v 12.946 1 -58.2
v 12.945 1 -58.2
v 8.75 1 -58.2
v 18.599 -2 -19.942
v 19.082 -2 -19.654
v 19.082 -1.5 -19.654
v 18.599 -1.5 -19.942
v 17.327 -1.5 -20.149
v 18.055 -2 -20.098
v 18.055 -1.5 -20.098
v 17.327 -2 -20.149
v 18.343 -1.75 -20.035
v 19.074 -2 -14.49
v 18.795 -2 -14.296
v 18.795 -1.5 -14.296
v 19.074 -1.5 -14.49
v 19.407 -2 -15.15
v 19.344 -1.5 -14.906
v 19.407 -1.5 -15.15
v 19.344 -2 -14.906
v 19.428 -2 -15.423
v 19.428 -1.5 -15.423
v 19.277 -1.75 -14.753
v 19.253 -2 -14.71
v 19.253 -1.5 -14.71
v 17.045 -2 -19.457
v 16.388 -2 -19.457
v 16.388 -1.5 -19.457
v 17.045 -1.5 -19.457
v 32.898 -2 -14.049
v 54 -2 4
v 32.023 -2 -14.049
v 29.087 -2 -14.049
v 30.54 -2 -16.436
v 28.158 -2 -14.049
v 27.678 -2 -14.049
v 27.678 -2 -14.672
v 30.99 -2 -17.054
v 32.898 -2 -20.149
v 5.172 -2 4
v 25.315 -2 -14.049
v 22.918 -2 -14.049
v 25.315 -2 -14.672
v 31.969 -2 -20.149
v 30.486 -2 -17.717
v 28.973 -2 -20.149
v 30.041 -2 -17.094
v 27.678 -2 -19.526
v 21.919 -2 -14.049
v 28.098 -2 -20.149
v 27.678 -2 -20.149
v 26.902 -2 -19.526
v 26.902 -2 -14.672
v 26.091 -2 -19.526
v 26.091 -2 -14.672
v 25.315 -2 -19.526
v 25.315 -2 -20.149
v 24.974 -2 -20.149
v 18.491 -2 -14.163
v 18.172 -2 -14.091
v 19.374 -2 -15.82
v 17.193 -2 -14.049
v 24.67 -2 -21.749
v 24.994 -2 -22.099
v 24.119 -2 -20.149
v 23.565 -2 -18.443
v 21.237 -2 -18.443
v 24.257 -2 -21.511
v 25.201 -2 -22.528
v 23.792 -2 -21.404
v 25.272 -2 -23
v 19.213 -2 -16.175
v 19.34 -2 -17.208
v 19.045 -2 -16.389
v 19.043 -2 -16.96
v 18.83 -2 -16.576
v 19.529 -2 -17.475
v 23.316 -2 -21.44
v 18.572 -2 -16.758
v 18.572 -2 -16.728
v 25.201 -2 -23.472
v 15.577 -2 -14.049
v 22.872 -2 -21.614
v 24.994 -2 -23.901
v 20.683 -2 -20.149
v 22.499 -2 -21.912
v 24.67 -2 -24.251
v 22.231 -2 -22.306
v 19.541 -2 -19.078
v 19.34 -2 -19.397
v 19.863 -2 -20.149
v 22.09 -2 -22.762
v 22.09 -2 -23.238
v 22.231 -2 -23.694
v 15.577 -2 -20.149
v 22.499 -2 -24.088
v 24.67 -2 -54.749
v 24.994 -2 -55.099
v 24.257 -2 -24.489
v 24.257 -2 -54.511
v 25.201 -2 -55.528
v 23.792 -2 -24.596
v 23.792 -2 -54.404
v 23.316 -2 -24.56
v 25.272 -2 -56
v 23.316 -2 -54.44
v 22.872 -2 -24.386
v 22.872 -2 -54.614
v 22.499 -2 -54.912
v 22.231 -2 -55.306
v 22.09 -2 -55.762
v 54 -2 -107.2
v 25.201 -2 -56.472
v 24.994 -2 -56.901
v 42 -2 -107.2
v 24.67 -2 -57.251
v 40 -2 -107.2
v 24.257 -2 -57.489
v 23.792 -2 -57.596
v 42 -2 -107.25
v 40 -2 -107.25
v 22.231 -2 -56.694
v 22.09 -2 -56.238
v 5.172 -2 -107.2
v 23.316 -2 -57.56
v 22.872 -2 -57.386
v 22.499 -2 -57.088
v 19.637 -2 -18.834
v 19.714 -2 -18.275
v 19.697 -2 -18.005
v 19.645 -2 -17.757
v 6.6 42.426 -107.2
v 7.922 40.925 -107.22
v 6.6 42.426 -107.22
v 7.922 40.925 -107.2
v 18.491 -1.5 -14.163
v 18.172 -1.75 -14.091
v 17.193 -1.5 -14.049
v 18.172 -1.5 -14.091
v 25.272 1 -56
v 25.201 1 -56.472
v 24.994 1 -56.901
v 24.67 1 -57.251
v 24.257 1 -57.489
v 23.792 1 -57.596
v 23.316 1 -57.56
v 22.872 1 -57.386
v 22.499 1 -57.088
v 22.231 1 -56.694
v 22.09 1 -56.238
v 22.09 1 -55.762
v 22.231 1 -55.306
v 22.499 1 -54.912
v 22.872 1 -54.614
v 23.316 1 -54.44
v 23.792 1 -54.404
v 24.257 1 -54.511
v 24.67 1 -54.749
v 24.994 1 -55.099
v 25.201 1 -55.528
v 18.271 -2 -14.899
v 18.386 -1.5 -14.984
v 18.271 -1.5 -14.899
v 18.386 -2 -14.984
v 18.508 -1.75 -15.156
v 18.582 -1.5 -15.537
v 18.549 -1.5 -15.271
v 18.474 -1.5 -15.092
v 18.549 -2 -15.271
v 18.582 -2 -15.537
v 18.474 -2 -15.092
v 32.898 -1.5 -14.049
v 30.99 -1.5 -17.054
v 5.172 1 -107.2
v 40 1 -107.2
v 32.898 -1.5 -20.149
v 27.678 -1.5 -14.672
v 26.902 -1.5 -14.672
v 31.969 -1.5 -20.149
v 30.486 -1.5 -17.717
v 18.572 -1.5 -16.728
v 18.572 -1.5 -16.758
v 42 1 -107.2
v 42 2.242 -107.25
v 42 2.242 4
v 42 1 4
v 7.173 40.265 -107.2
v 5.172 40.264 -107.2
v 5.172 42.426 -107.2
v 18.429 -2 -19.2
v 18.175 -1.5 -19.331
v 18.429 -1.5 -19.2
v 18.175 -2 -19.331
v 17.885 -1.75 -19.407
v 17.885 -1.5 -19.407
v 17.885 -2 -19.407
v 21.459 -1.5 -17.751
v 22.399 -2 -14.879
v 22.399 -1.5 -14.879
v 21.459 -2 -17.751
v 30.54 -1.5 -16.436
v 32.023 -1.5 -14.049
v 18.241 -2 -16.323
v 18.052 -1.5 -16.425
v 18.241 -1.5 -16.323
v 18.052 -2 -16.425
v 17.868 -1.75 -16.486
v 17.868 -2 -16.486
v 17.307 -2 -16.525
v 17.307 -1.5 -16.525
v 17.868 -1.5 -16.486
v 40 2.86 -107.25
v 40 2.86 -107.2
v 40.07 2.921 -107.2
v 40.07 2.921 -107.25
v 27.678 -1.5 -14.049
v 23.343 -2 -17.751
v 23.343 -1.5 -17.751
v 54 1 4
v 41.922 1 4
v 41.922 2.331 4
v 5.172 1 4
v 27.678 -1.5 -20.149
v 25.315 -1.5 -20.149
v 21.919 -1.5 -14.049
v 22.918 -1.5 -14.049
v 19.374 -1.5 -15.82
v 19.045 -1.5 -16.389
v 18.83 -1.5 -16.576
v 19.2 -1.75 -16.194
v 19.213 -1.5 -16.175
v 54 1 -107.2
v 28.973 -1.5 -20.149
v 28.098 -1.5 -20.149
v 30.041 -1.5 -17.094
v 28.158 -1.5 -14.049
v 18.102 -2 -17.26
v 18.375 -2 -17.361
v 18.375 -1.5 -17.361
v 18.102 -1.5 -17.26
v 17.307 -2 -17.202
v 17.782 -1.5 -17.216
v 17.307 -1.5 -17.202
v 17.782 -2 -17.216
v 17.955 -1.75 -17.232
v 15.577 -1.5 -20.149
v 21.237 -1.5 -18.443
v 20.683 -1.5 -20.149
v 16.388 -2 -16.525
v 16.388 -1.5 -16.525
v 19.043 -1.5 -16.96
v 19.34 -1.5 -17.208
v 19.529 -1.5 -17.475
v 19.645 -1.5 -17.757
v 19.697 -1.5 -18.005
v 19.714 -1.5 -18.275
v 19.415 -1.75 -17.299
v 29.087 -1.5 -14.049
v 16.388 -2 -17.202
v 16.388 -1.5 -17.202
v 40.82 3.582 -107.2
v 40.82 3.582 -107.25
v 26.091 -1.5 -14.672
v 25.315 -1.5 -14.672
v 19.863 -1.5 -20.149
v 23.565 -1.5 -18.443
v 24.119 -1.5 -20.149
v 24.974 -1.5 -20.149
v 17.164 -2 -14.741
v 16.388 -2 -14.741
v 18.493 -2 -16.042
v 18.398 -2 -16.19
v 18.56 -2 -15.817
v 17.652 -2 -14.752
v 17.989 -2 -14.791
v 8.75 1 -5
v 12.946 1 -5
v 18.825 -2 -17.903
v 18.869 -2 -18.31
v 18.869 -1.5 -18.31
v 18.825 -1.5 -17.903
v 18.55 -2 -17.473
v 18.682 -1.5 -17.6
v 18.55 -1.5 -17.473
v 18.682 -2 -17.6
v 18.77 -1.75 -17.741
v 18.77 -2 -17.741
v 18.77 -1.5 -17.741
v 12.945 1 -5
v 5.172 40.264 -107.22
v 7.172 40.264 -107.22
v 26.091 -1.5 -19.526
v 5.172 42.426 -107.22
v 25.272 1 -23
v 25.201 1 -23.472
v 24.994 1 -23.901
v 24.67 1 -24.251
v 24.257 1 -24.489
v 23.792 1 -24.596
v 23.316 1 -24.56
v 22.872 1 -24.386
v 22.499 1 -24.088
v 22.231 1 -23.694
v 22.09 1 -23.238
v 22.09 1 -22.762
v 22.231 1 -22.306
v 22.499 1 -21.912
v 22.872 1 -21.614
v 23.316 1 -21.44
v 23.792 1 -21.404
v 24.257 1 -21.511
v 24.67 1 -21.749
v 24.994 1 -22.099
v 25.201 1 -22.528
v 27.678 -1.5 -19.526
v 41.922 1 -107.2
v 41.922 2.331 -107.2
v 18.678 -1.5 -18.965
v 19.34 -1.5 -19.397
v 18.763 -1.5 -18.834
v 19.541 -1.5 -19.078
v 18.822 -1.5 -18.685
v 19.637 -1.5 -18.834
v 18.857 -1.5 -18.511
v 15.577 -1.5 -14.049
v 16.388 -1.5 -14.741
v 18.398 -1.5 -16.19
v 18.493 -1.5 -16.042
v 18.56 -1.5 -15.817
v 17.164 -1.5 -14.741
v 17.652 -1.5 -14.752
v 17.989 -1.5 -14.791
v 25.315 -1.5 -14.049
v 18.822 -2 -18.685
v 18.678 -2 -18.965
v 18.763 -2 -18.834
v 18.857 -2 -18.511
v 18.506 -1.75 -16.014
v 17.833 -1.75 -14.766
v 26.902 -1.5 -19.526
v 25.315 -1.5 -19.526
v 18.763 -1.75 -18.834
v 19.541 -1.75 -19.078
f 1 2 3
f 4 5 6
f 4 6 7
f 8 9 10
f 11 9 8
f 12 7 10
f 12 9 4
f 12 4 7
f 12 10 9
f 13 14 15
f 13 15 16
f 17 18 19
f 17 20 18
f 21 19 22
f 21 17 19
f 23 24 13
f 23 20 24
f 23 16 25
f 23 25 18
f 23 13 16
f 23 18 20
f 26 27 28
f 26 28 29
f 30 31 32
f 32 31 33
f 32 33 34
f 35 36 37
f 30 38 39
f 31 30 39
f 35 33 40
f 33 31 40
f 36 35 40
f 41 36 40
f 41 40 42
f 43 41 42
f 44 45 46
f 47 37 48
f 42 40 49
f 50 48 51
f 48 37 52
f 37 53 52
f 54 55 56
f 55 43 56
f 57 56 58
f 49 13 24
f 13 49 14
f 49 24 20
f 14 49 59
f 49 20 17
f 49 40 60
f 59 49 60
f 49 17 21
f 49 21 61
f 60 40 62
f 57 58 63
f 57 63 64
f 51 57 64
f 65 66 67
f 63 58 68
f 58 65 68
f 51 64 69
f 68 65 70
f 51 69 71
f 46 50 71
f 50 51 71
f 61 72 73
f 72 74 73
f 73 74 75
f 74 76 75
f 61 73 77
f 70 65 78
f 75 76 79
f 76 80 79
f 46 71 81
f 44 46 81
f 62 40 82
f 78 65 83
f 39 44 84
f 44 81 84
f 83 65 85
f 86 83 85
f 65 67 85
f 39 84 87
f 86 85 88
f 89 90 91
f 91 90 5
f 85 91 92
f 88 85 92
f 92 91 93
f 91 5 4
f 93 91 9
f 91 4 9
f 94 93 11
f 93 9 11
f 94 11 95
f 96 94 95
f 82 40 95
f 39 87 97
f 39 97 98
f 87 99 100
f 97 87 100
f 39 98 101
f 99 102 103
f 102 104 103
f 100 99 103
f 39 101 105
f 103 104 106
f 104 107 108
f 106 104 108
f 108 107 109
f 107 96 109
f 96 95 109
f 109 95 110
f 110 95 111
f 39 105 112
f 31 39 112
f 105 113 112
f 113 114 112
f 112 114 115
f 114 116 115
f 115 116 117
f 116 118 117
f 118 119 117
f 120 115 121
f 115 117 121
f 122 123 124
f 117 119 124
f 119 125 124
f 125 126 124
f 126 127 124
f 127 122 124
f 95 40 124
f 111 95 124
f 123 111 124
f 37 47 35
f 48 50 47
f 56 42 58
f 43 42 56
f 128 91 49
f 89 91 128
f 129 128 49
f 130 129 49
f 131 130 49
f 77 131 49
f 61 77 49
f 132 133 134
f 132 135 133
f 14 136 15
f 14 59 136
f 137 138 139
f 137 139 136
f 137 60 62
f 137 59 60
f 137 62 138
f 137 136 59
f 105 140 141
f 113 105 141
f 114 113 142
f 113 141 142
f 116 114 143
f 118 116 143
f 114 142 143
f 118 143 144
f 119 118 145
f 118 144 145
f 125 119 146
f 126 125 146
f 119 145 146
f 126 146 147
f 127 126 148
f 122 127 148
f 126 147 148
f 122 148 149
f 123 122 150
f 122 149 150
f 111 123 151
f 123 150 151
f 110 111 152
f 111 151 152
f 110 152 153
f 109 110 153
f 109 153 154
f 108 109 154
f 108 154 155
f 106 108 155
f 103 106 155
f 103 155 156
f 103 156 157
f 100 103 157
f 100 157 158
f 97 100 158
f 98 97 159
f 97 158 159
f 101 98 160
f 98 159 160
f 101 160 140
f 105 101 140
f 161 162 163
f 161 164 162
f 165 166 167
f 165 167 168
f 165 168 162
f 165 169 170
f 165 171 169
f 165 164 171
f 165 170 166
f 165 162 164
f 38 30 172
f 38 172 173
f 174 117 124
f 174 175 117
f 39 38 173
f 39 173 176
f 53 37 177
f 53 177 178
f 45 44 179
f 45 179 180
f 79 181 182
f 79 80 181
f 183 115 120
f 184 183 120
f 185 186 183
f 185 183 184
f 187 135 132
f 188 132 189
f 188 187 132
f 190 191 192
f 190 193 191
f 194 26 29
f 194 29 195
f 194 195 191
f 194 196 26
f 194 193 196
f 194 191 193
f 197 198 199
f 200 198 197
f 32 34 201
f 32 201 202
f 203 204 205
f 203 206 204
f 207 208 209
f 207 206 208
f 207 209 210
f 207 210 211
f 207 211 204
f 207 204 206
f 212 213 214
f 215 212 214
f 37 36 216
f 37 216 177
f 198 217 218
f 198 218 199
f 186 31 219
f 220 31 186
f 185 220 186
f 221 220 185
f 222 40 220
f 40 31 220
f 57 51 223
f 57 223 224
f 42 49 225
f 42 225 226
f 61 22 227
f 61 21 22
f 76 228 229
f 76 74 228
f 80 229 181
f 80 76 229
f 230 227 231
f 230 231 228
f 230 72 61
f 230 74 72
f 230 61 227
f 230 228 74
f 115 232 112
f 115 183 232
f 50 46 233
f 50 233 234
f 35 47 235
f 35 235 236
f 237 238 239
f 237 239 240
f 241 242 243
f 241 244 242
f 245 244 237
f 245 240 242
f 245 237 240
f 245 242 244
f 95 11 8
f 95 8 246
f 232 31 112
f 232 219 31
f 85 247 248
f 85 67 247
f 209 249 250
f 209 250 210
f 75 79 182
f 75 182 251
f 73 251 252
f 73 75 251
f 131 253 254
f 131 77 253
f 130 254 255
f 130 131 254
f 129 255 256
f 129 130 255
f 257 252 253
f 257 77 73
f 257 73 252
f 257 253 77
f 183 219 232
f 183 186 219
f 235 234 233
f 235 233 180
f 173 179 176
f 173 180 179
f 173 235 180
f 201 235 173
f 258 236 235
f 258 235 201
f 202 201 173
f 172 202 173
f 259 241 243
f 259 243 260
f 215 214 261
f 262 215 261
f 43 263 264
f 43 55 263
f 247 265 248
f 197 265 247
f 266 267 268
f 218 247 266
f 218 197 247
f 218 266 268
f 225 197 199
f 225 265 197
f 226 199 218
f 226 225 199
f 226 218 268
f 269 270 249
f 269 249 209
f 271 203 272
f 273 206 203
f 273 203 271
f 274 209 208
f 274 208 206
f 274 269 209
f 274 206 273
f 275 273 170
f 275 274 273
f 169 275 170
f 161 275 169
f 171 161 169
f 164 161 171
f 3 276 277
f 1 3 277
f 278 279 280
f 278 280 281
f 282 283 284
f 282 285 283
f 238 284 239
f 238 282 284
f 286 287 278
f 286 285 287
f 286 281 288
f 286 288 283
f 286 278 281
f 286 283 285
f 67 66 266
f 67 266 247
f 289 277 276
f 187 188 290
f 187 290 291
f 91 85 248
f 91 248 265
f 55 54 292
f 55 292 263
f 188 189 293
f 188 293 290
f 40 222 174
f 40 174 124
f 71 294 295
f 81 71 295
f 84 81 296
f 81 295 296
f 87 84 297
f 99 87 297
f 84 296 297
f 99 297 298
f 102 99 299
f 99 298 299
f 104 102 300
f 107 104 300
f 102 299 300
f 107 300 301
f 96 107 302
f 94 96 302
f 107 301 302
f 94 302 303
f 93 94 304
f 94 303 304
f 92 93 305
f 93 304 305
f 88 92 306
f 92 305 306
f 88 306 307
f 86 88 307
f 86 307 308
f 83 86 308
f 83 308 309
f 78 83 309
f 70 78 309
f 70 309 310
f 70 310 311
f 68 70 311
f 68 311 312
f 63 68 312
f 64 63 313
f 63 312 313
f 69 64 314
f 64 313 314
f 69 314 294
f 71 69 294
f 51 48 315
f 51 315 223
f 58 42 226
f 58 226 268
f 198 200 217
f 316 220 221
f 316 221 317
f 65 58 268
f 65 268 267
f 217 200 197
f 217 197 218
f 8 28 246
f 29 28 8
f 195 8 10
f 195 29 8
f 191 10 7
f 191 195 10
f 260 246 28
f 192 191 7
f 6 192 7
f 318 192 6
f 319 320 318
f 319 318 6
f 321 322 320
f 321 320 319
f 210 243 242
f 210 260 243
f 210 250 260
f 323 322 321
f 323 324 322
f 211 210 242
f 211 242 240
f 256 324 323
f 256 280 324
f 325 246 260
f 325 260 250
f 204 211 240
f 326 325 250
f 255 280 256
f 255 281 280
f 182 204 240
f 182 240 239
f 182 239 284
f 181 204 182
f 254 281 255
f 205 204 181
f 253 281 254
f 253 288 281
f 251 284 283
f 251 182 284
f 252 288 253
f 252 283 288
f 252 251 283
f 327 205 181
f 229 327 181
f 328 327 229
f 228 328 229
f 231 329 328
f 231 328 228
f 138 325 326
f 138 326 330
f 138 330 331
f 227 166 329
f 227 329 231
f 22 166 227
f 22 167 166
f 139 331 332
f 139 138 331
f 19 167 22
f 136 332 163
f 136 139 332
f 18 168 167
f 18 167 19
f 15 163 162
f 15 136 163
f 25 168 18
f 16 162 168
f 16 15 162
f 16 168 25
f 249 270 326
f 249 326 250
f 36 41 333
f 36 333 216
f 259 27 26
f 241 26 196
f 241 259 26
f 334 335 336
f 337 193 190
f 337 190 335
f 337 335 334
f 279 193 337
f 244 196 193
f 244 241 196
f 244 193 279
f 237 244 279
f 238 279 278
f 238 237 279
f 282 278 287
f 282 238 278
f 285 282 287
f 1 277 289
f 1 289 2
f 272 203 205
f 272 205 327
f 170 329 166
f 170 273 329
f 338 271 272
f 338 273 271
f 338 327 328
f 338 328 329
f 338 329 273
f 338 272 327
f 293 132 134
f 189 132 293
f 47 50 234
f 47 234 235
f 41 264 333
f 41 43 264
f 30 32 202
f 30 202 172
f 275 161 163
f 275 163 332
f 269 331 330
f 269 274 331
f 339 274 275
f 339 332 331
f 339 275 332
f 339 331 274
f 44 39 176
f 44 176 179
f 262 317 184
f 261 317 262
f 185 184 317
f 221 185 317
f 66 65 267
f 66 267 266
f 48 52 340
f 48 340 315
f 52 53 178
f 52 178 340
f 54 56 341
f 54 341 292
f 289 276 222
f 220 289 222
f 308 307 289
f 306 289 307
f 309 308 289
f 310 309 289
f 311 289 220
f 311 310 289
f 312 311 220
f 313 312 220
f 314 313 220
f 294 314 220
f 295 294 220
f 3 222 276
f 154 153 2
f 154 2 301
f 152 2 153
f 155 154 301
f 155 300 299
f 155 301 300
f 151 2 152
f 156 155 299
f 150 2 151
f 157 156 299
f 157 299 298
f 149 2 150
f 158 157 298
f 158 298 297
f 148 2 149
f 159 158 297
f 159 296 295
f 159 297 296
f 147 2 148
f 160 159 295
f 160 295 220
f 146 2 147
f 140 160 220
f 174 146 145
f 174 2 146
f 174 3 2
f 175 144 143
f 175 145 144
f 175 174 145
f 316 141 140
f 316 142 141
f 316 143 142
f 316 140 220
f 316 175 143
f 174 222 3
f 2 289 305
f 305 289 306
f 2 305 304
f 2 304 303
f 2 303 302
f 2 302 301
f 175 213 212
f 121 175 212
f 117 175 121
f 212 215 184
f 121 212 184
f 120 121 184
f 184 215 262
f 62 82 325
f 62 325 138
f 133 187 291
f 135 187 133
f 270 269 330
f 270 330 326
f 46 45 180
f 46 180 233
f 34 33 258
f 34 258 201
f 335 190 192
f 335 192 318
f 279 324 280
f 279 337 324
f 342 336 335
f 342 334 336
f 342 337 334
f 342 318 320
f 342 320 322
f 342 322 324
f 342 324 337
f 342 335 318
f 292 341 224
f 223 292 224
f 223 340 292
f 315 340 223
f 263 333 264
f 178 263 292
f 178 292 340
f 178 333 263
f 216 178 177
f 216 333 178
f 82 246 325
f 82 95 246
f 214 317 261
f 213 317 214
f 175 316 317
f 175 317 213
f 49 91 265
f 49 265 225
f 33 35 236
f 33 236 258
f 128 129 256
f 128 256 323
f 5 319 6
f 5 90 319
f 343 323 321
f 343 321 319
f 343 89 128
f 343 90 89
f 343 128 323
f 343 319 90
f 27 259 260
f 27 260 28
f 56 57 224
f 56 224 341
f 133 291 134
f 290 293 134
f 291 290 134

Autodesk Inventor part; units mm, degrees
ref_plane "YZ Plane" through (0, 0, 0) normal (1, 0, 0) x (0, 1, 0)
ref_plane "XZ Plane" through (0, 0, 0) normal (0, 1, 0) x (-1, 0, 0)
ref_plane "XY Plane" through (0, 0, 0) normal (0, 0, 1) x (1, 0, 0)
sketch "Boceto3" plane through (0, 0, 0) normal (0, 0, 1) x (1, 0, 0)
  line L0 (40, 0) -> (37, 0)
  line L1 (0, 0) -> (0, 45)
  line L2 (0, 45) -> (3, 45)
  line L3 (40, 0) -> (40, 3)
  line L4 (40, 3) -> (3, 45)
  line L5 (0, 0) -> (40, 0)
  dimension "d3" = 3
  dimension "d4" = 45
  dimension "d5" = 3
  dimension "d6" = 3
extrude "Extrusión1" add sketch "Boceto3" against normal blind 98.2
sketch "Boceto4" plane through (0, 0, 0) normal (0, 0, 1) x (1, 0, 0)
  line L0 (3.3154, 41.6201) -> (2, 43)
  line L1 (3.3154, 41.6201) -> (38, 2)
  line L2 (38, 2) -> (2, 2)
  line L3 (2, 2) -> (2, 43)
  point P0 (0, 45)
extrude "Extrusión2" cut sketch "Boceto4" against normal blind 210.55
sketch "Boceto6" plane through (0, 0, 0) normal (0, 0, 1) x (1, 0, 0)
  line L0 (1.0395, 0.9992) -> (39.0395, 0.9992)
  line L1 (39.0395, 1.0003) -> (39.0395, 1.9993) projected
  line L2 (39.0395, 0.9992) -> (39.0395, 1.9993)
  line L3 (39.0395, 1.9993) -> (3, 44.0003)
  line L4 (2.88, 44.0003) -> (1, 44.0003) projected
  line L5 (3, 44.0003) -> (1, 44.0003)
  line L6 (1, 1.0003) -> (39.0395, 1.0003) projected
  line L7 (1, 44.0003) -> (1, 1.0003)
  point P0 (0, 0)
extrude "Extrusión3" add sketch "Boceto6" against normal blind 2
sketch "Boceto7" plane through (0, 0, -98.2) normal (0, 0, -1) x (-1, 0, 0)
  line L0 (-1, 1.0003) -> (-39.0395, 1.0003) projected
  line L1 (-1, 1.0003) -> (-39.0395, 1.0003)
  line L2 (-39.0395, 1.0003) -> (-39.0395, 2)
  line L3 (-39.0395, 1.9993) -> (-2.88, 44.0003) projected
  line L4 (-39.0395, 2) -> (-2.88, 44.0003)
  line L5 (-2.88, 44.0003) -> (-1, 44.0003) projected
  line L6 (-1, 44.0003) -> (-1, 1.0003)
  line L7 (-2.88, 44.0003) -> (6.9067, 55.3678)
  line L8 (6.9067, 55.3678) -> (10.1689, 59.157)
  line L9 (10.1689, 59.157) -> (10.1689, 0)
  line L10 (10.1689, 0) -> (0, 0)
  dimension "d68" = 15
  dimension "d70" = 5
extrude "Extrusión4" add sketch "Boceto7" against normal blind 2
sketch "Boceto10" plane through (0, 0, -96.2) normal (0, 0, 1) x (1, 0, 0)
  line L0 (20.1691, 1.0003) -> (21.6691, 1.0003)
  line L1 (39.0395, 1.0003) -> (1, 1.0003) projected
  line L2 (21.6691, 1.0003) -> (21.6691, 22.1759)
  line L3 (2.88, 44.0003) -> (39.0395, 1.9993) projected
  line L4 (21.6691, 22.1759) -> (20.1691, 23.9182)
  line L5 (20.1691, 23.9182) -> (20.1691, 1.0003)
  point P0 (0, 0)
  dimension "d49" = 1.5
extrude "Extrusión7" add sketch "Boceto10" along normal blind 96
sketch "Boceto15" plane through (0, 0, -98.2) normal (0, 0, -1) x (-1, 0, 0)
  line L0 (-3, 45) -> (-40, 3) projected
  line L1 (-20.3927, 25.257) -> (-7.1721, 40.2641)
  line L2 (-7.1721, 40.2641) -> (-7.1721, 0)
  line L3 (-20.1691, 1.0003) -> (-1, 1.0003) projected
  line L4 (-7.1721, 40.2641) -> (-3, 45)
  line L5 (0, 45) -> (-3, 45)
  line L6 (0, 0) -> (0, 45) projected
  line L7 (0, 45) -> (0, 0)
  line L8 (0, 0) -> (-7.1721, 0)
  line L9 (-40, 0) -> (0, 0) projected
  dimension "d71" = 20
extrude "Extrusión9" cut sketch "Boceto15" against normal blind 617.4
sketch "Boceto16" plane through (0, 0, -96.2) normal (0, 0, 1) x (1, 0, 0)
  line L0 (7.1721, 1) -> (8.6721, 1.0003)
  line L1 (20.1691, 1.0003) -> (7.1721, 1.0003) projected
  line L2 (8.6721, 1.0003) -> (8.6721, 37.2725)
  line L3 (7.1721, 39.0149) -> (20.1691, 23.9182) projected
  line L4 (8.6721, 37.2725) -> (7.1721, 39.0149)
  line L5 (7.1721, 39.0149) -> (7.1721, 1)
  point P0 (0, 0)
  dimension "d74" = 1.5
extrude "Extrusión10" add sketch "Boceto16" along normal blind 95.4
sketch "Boceto17" plane through (0, 0, 0) normal (0, 0, 1) x (1, 0, 0)
  line L0 (20.1691, 1.0003) -> (8.6721, 1.0003) projected
  line L1 (8.6721, 35.5011) -> (8.6721, 2) projected
  line L2 (8.6721, 1.0003) -> (8.6721, 37.2725)
  line L3 (39.0395, 1.9993) -> (21.6691, 22.1759) projected
  line L4 (8.6721, 37.2725) -> (39.0395, 1.9993)
  line L5 (39.0395, 1.9993) -> (39.0395, 1.0003)
  line L6 (39.0395, 1.0003) -> (8.6721, 1.0003)
  line L7 (40, 0) -> (7.1721, 0) projected
  point P0 (0, 0)
extrude "Extrusión11" cut sketch "Boceto17" against normal blind 235.6
sketch "Boceto21" plane through (40, 3, 0) normal (0.7504, 0.661, 0) x (0, 0, -1)
  line L0 (5, 24.1901) -> (5, 36.1901)
  line L1 (5, 36.1901) -> (5, 12.1901)
  line L2 (76, 36.1901) -> (5, 36.1901)
  line L3 (85, 24.1901) -> (85, 18.1901)
  line L4 (85, 18.1901) -> (91, 18.1901)
  line L5 (91, 18.1901) -> (97, 18.1901)
  line L6 (97, 18.1901) -> (97, 30.1901)
  line L7 (97, 30.1901) -> (85, 30.1901)
  line L8 (85, 30.1901) -> (85, 24.1901)
  line L9 (76, 24.1901) -> (81, 24.1901)
  line L10 (81, 24.1901) -> (85, 24.1901)
  line L11 (76, 36.1901) -> (77, 36.1901)
  line L12 (77, 36.1901) -> (77, 12.1901)
  line L13 (77, 12.1901) -> (76, 12.1901)
  line L14 (77, 12.1901) -> (77, 11.1901)
  line L15 (77, 11.1901) -> (5, 11.1901)
  line L16 (5, 11.1901) -> (5, 12.1901)
  point P0 (0, 24.1901)
  dimension "d114" = 5
  dimension "d176" = 1
  dimension "d177" = 1
extrude "Extrusión13" cut sketch "Boceto21" against normal blind 1.5
sketch "Boceto22" plane through (0, 0, 0) normal (0, 0, 1) x (1, 0, 0)
  line L0 (8.6721, 1.0003) -> (39.0395, 1.0003) projected
  line L1 (8.6721, 1.0003) -> (39.0395, 1.0003)
  line L2 (39.0395, 1.0003) -> (39.0395, 2)
  line L3 (39.0395, 2) -> (8.6721, 37)
  line L4 (8.6721, 37.2725) -> (8.6721, 1.0003) projected
  line L5 (8.6721, 37) -> (8.6721, 1.0003)
  line L6 (7.1721, 0) -> (7.1721, 40.2641) projected
  line L7 (7.1721, 40.2641) -> (7.1721, 0)
  line L8 (40, 3) -> (40, 0) projected
  line L9 (7.1721, 0) -> (40, 0)
  line L10 (40, 0) -> (40, 3)
  line L11 (40, 3) -> (7.1721, 40.2641)
  line L12 (7.1721, 40.2641) -> (40, 3) projected
  point P0 (0, 0)
extrude "Extrusión14" add sketch "Boceto22" along normal blind 2
sketch "Boceto24" plane through (0, 0, 2) normal (0, 0, 1) x (1, 0, 0)
  line L0 (8.6721, 1.0003) -> (8.6721, 37) projected
  line L1 (39.0395, 1.0003) -> (8.6721, 1.0003) projected
  line L2 (8.6721, 1.0003) -> (39.0395, 1.0003)
  line L3 (39.0395, 1.0003) -> (39.0395, 2)
  line L4 (39.0395, 2) -> (8.6721, 37)
  line L5 (8.6721, 37) -> (8.6721, 1.0003)
  point P0 (0, 0)
extrude "Extrusión15" add sketch "Boceto24" against normal blind 2
sketch "Boceto25" plane through (0, 0, -98.2) normal (0, 0, -1) x (-1, 0, 0)
  line L0 (-8.6721, 1.0003) -> (-8.6721, 37.2725) projected
  line L1 (-8.6721, 1.0003) -> (-8.6721, 37.2725)
  line L2 (-8.6721, 37.2725) -> (-39, 2)
  line L3 (-39, 2) -> (-39, 1.0003)
  line L4 (-39, 1.0003) -> (-8.6721, 1.0003)
  line L5 (-7.1721, 0) -> (-40, 0) projected
  line L6 (-7.1721, 40) -> (-7.1721, 0)
  line L7 (-40, 0) -> (-7.1721, 0)
  line L8 (-40, 0) -> (-40, 2.8598)
  line L9 (-7.1721, 0) -> (-7.1721, 40.2641) projected
  line L10 (-40, 2.8598) -> (-7.1721, 40.2641)
  point P0 (0, 0)
extrude "Extrusión16" add sketch "Boceto25" along normal blind 7
sketch "Boceto27" plane through (0, 0, -105.2) normal (0, 0, -1) x (-1, 0, 0)
  line L0 (-8.6721, 1.0003) -> (-39.0395, 1.0003) projected
  line L1 (-8.6721, 1.0003) -> (-39.0395, 1.0003)
  line L2 (-39.0395, 1.0003) -> (-39.0395, 1.9993)
  line L3 (-8.6721, 1.0003) -> (-8.6721, 37.2725) projected
  line L4 (-39.0395, 1.9993) -> (-8.6721, 37.2725)
  line L5 (-8.6721, 37.2725) -> (-8.6721, 1.0003)
  point P0 (0, 0)
extrude "Extrusión17" add sketch "Boceto27" against normal blind 2
sketch "Boceto28" plane through (7.1721, 0, 2) normal (0, -1, 0) x (1, 0, 0)
  line L0 (0, 0) -> (0, -107.2) projected
  line L1 (32.8279, 0) -> (32.8279, -107.2) projected
  line L2 (0, 0) -> (32.8279, 0)
  line L3 (32.8279, 0) -> (32.8279, -107.2)
  line L4 (32.8279, -107.2) -> (0, -107.2)
  line L5 (0, -107.2) -> (0, 0)
  point P0 (-7.1721, -2)
extrude "Extrusión18" add sketch "Boceto28" along normal blind 2
sketch "Boceto29" plane through (7.1721, 40.2641, -98.2) normal (-1, 0, 0) x (0, 0, 1)
  line L0 (0, 0) -> (-7, 0) projected
  line L1 (100.2, -37.2641) -> (100.2, -42.2641) projected
  line L2 (-7, 0) -> (100.2, 0)
  line L3 (100.2, 0) -> (100.2, -42.2641)
  line L4 (100.2, -42.2641) -> (-7, -42.2641)
  line L5 (-7, -42.2641) -> (-7, 0)
  point P0 (98.2, -40.2641)
extrude "Extrusión19" add sketch "Boceto29" along normal blind 2
sketch "Boceto30" plane through (0, 0, -105.2) normal (0, 0, -1) x (-1, 0, 0)
  line L0 (-7.1721, 40.2641) -> (-5.1721, 40.2641)
  line L1 (-5.1721, 40.2641) -> (-5.1721, -2) projected
  line L2 (-5.1721, 40.2641) -> (-5.1721, -2)
  line L3 (-40, -2) -> (-5.1721, -2) projected
  line L4 (-5.1721, -2) -> (-40, -2)
  line L5 (-40, 2.8598) -> (-40, -2) projected
  line L6 (-40, -2) -> (-40, 2.8598)
  line L7 (-40, 2.8598) -> (-7.1721, 40.2641)
  line L8 (-7.1721, 40.2641) -> (-5.1721, 40.2641)
  point P0 (0, 0)
extrude "Extrusión20" add sketch "Boceto30" along normal blind 2
sketch "Boceto31" plane through (0, 0, 2) normal (0, 0, 1) x (1, 0, 0)
  line L0 (5.1721, -2) -> (5.1721, 40.2641) projected
  line L1 (5.1721, 40.2643) -> (5.1721, -2)
  line L2 (40, -2) -> (5.1721, -2) projected
  line L3 (5.1721, -2) -> (40, -2)
  line L4 (40, 2.8598) -> (40, -2) projected
  line L5 (40, -2) -> (40, 2.8598)
  line L6 (40, 2.8598) -> (7.1721, 40.2641) projected
  line L7 (7.1721, 40.2641) -> (40, 2.8598)
  line L8 (7.1721, 40.2641) -> (5.1721, 40.2641)
  point P0 (0, 0)
extrude "Extrusión21" add sketch "Boceto31" along normal blind 2
sketch "Boceto32" plane through (40, 3, 2) normal (0.7504, 0.661, 0) x (0, 0, -1)
  line L0 (-2, 49.6617) -> (-2, 0)
  line L1 (-2, 0) -> (109.2, 0)
  line L2 (109.2, -3.7518) -> (109.2, 19.2705) projected
  line L3 (100.2, -0.1052) -> (109.2, -0.1052) projected
  line L4 (109.2, 49.6617) -> (109.2, -0.1052)
  line L5 (109.2, 49.6617) -> (-2, 49.6617)
  line L6 (-2, 50.9838) -> (-2, 19.2705) projected
  line L7 (7, 11.1901) -> (7, 36.1901) projected
  line L8 (7, 36.1901) -> (7, 12.1901)
  line L9 (78, 36.1901) -> (7, 36.1901)
  line L10 (87, 30.1901) -> (99, 30.1901) projected
  line L11 (87, 18.1901) -> (87, 30.1901) projected
  line L12 (87, 30.1901) -> (87, 18.1901)
  line L13 (99, 30.1901) -> (99, 18.1901) projected
  line L14 (87, 18.1901) -> (99, 18.1901)
  line L15 (99, 18.1901) -> (99, 30.1901)
  line L16 (100.2, 49.6617) -> (109.2, 49.6617) projected
  line L17 (109.2, 49.6617) -> (109.2, -0.1052)
  line L18 (-2, -3.7518) -> (-2, -0.1052) projected
  line L19 (109.2, -0.1052) -> (-2, -0.1052)
  line L20 (-2, -0.1052) -> (-2, 49.6617)
  line L21 (109.2, 49.6617) -> (-2, 49.6617)
  line L22 (87, 30.1901) -> (99, 30.1901)
  line L23 (7, 12.1901) -> (7, 11.1901)
  line L24 (7, 11.1901) -> (79, 11.1901)
  line L25 (79, 11.1901) -> (79, 36.1901)
  line L26 (79, 36.1901) -> (78, 36.1901)
  point P0 (2, 24.1901)
  dimension "d174" = 1
  dimension "d175" = 72
extrude "Extrusión22" add sketch "Boceto32" along normal blind 1
sketch "Boceto33" plane through (40.7504, 3.661, 2) normal (0.7504, 0.661, 0) x (0, 0, -1)
  line L0 (87, 30.1901) -> (87, 18.1901) projected
  line L1 (87, 30.1901) -> (99, 30.1901) projected
  line L2 (87, 30.1901) -> (99, 30.1901)
  line L3 (99, 30.1901) -> (99, 18.1338)
  line L4 (100.2, -0.1052) -> (100.2, 49.6617) projected
  line L5 (99, 18.1338) -> (87, 18.1338)
  line L6 (87, 30.1901) -> (87, 34.1901)
  line L7 (87, 34.1901) -> (83, 34.1901)
  line L8 (99, 18.1901) -> (99, 14.1901)
  line L9 (99, 14.1901) -> (103, 14.1901)
  line L10 (83, 34.1901) -> (103, 34.1901)
  line L11 (103, 34.1901) -> (103, 14.1901)
  line L12 (103, 14.1901) -> (83, 14.1901)
  line L13 (83, 14.1901) -> (83, 34.1901)
  point P0 (2, 24.1901)
  dimension "d126" = 4
  dimension "d127" = 4
  dimension "d129" = 4
  dimension "d130" = 4
extrude "Extrusión23" add sketch "Boceto33" against normal blind 2.5
sketch "Boceto34" plane through (40.7504, 3.661, 2) normal (0.7504, 0.661, 0) x (0, 0, -1)
  line L0 (99, 18.1901) -> (99, 30.1901)
  line L1 (99, 18.1901) -> (87, 18.1901)
  line L2 (87, 18.1901) -> (87, 30.1901)
  line L3 (99, 30.1901) -> (99, 18.1901)
  line L4 (99, 30.1901) -> (99, 18.1901)
  line L5 (87, 18.1901) -> (99, 18.1901)
  line L6 (99, 30.1901) -> (99, 31.1901)
  line L7 (99, 31.1901) -> (87, 31.1901)
  line L8 (87, 31.1901) -> (87, 30.1901)
  point P0 (2, 24.1901)
  point P1 (83, 34.1901)
  dimension "d173" = 1
extrude "Extrusión24" cut sketch "Boceto34" against normal blind 6
sketch "Boceto35" plane through (40.0695, 2.9211, 4) normal (0, 0, 1) x (0.7504, 0.661, 0)
  line L0 (0, 49.7669) -> (1, 49.7669) projected
  line L1 (1, 49.7669) -> (0, 49.7669)
  line L2 (0, 49.7669) -> (0, 0)
  line L3 (0, 0) -> (1, 0) projected
  line L4 (0, 0) -> (1, 0)
  line L5 (1, 0) -> (1, 49.7669)
  point P0 (-31.9975, 24.2953)
extrude "Extrusión25" cut sketch "Boceto35" against normal blind 0.0001
sketch "Boceto36" plane through (0, 0, 4) normal (0, 0, 1) x (1, 0, 0)
  line L0 (5.1721, 40.2641) -> (7.1721, 40.2641) projected
  line L1 (7.1721, 40.2641) -> (40, 2.8598) projected
  line L2 (5.1721, 40.2641) -> (7.1721, 40.2641)
  line L3 (7.1721, 40.2641) -> (7.9224, 40.9252) projected
  line L4 (7.1721, 40.2641) -> (7.9224, 40.9252)
  line L5 (7.9224, 40.9252) -> (6.6004, 42.4259)
  line L6 (6.6004, 42.4259) -> (5.1721, 42.4259)
  line L7 (5.1721, -2) -> (5.1721, 40.2641) projected
  line L8 (5.1721, 42.4259) -> (5.1721, 40.2641)
  point P0 (0, 0)
  dimension "d140" = 2
extrude "Extrusión26" add sketch "Boceto36" against normal blind 111.22
sketch "Boceto37" plane through (0, 0, 4) normal (0, 0, 1) x (1, 0, 0)
  line L0 (40.0695, 2.9211) -> (7.1721, 40.2641) projected
  line L1 (40.0695, 2.9211) -> (39.9946, 2.8551)
  line L2 (39.9946, 2.8551) -> (7.1346, 40.2311)
  line L3 (7.1721, 40.2641) -> (7.9224, 40.9252) projected
  line L4 (7.1346, 40.2311) -> (7.9224, 40.9252)
  line L5 (7.9224, 40.9252) -> (40.0695, 2.9211)
  point P0 (0, 0)
extrude "Extrusión27" add sketch "Boceto37" against normal blind 2 contours L1 L2 L4 L0
sketch "Boceto38" plane through (0, 0, 4) normal (0, 0, 1) x (1, 0, 0)
  line L0 (40, 2.8598) -> (40, -2) projected
  line L1 (40, -2) -> (40, 2.8598)
  line L2 (40.0695, 2.9211) -> (40.8199, 3.5821) projected
  line L3 (40, 2.8598) -> (40.8199, 3.5821)
  line L4 (40, -2) -> (42, -2)
  line L5 (42, -2) -> (42, 2.2425)
  line L6 (42, 2.2425) -> (40.8199, 3.5821)
  point P0 (0, 0)
extrude "Extrusión28" add sketch "Boceto38" against normal blind 111.25
sketch "Boceto39" plane through (0, 0, -107.2) normal (0, 0, -1) x (-1, 0, 0)
  line L0 (-40.0695, 2.9211) -> (-40.8199, 3.5821) projected
  line L1 (-40.0695, 2.9211) -> (-40, 2.8598)
  line L2 (-40.0695, 2.9211) -> (-7.1721, 40.2641) projected
  line L3 (-40, 2.8598) -> (-7.1721, 40.2641)
  line L4 (-7.1721, 40.2641) -> (-40.0695, 2.9211)
  line L5 (-40.0695, 2.9211) -> (-40, 2.8598)
  point P0 (0, 0)
extrude "Extrusión29" add sketch "Boceto39" against normal blind 2
sketch "Boceto40" plane through (7.1721, -2, 2) normal (0, -1, 0) x (1, 0, 0)
  line L0 (7.7868, -16.0487) -> (16.7678, -16.0487) construction
  line L1 (16.7678, -16.0487) -> (16.7678, -19.0967) construction
  line L2 (16.7678, -19.0967) -> (7.7868, -19.0967) construction
  line L3 (7.7868, -19.0967) -> (7.7868, -16.0487) construction
  spline S0 degree 2 poles (12.5423, -20.2752) (12.5423, -20.73) (12.1962, -21.427) (11.9095, -21.6544) knots 0 0 0 1 2 2 2
  spline S1 degree 2 poles (11.9095, -21.6544) (11.5635, -21.9213) (10.7775, -22.1487) (10.1547, -22.1487) knots 0 0 0 1 2 2 2
  line L4 (10.1547, -22.1487) -> (8.4047, -22.1487)
  line L5 (8.4047, -22.1487) -> (8.4047, -16.0487)
  line L6 (8.4047, -16.0487) -> (10.0212, -16.0487)
  spline S2 degree 2 poles (10.0212, -16.0487) (10.6737, -16.0487) (11.3262, -16.1327) (11.6228, -16.2959) knots 0 0 0 1 2 2 2
  spline S3 degree 2 poles (11.6228, -16.2959) (11.954, -16.4689) (12.2556, -17.0374) (12.2556, -17.4229) knots 0 0 0 1 2 2 2
  spline S4 degree 2 poles (12.2556, -17.4229) (12.2556, -17.853) (11.8008, -18.5352) (11.4004, -18.728) knots 0 0 0 1 2 2 2
  line L7 (11.4004, -18.728) -> (11.4004, -18.7576)
  spline S5 degree 2 poles (11.4004, -18.7576) (11.9441, -18.9059) (12.5423, -19.6919) (12.5423, -20.2752) knots 0 0 0 1 2 2 2
  spline S6 degree 2 poles (11.697, -20.3098) (11.697, -19.9638) (11.4992, -19.5189) (11.2026, -19.3607) knots 0 0 0 1 2 2 2
  spline S7 degree 2 poles (11.2026, -19.3607) (11.0099, -19.2618) (10.5551, -19.2025) (10.1349, -19.2025) knots 0 0 0 1 2 2 2
  line L8 (10.1349, -19.2025) -> (9.2154, -19.2025)
  line L9 (9.2154, -19.2025) -> (9.2154, -21.4566)
  line L10 (9.2154, -21.4566) -> (9.8729, -21.4566)
  spline S8 degree 2 poles (9.8729, -21.4566) (10.4068, -21.4566) (11.0197, -21.3578) (11.257, -21.1996) knots 0 0 0 1 2 2 2
  spline S9 degree 2 poles (11.257, -21.1996) (11.4844, -21.0365) (11.697, -20.6311) (11.697, -20.3098) knots 0 0 0 1 2 2 2
  spline S10 degree 2 poles (11.4103, -17.5366) (11.4103, -17.3191) (11.262, -16.9929) (11.0988, -16.8989) knots 0 0 0 1 2 2 2
  spline S11 degree 2 poles (11.0988, -16.8989) (10.9011, -16.7902) (10.4216, -16.7408) (9.9915, -16.7408) knots 0 0 0 1 2 2 2
  line L11 (9.9915, -16.7408) -> (9.2154, -16.7408)
  line L12 (9.2154, -16.7408) -> (9.2154, -18.5253)
  line L13 (9.2154, -18.5253) -> (10.1349, -18.5253)
  spline S12 degree 2 poles (10.1349, -18.5253) (10.5155, -18.5253) (10.8764, -18.4462) (11.0692, -18.3226) knots 0 0 0 1 2 2 2
  spline S13 degree 2 poles (11.0692, -18.3226) (11.257, -18.204) (11.4103, -17.8233) (11.4103, -17.5366) knots 0 0 0 1 2 2 2
  line L14 (12.6906, -22.1487) -> (14.747, -16.0487)
  line L15 (14.747, -16.0487) -> (15.7455, -16.0487)
  line L16 (15.7455, -16.0487) -> (17.8019, -22.1487)
  line L17 (17.8019, -22.1487) -> (16.9467, -22.1487)
  line L18 (16.9467, -22.1487) -> (16.3931, -20.4433)
  line L19 (16.3931, -20.4433) -> (14.0648, -20.4433)
  line L20 (14.0648, -20.4433) -> (13.5111, -22.1487)
  line L21 (13.5111, -22.1487) -> (12.6906, -22.1487)
  line L22 (16.1706, -19.7512) -> (15.2265, -16.8792)
  line L23 (15.2265, -16.8792) -> (14.2872, -19.7512)
  line L24 (14.2872, -19.7512) -> (16.1706, -19.7512)
  line L25 (20.5059, -22.1487) -> (18.143, -22.1487)
  line L26 (18.143, -22.1487) -> (18.143, -21.5258)
  line L27 (18.143, -21.5258) -> (18.9191, -21.5258)
  line L28 (18.9191, -21.5258) -> (18.9191, -16.6716)
  line L29 (18.9191, -16.6716) -> (18.143, -16.6716)
  line L30 (18.143, -16.6716) -> (18.143, -16.0487)
  line L31 (18.143, -16.0487) -> (20.5059, -16.0487)
  line L32 (20.5059, -16.0487) -> (20.5059, -16.6716)
  line L33 (20.5059, -16.6716) -> (19.7298, -16.6716)
  line L34 (19.7298, -16.6716) -> (19.7298, -21.5258)
  line L35 (19.7298, -21.5258) -> (20.5059, -21.5258)
  line L36 (20.5059, -21.5258) -> (20.5059, -22.1487)
  line L37 (25.726, -22.1487) -> (24.7966, -22.1487)
  line L38 (24.7966, -22.1487) -> (23.3137, -19.7166)
  line L39 (23.3137, -19.7166) -> (21.801, -22.1487)
  line L40 (21.801, -22.1487) -> (20.9261, -22.1487)
  line L41 (20.9261, -22.1487) -> (22.8688, -19.0938)
  line L42 (22.8688, -19.0938) -> (20.9854, -16.0487)
  line L43 (20.9854, -16.0487) -> (21.9147, -16.0487)
  line L44 (21.9147, -16.0487) -> (23.368, -18.4363)
  line L45 (23.368, -18.4363) -> (24.851, -16.0487)
  line L46 (24.851, -16.0487) -> (25.726, -16.0487)
  line L47 (25.726, -16.0487) -> (23.8179, -19.0542)
  line L48 (23.8179, -19.0542) -> (25.726, -22.1487)
  point P0 (-7.1721, -2)
extrude "Extrusión30" cut sketch "Boceto40" against normal blind 0.5
sketch "Boceto41" plane through (8.6721, 1.0003, 0) normal (0, 1, 0) x (1, 0, 0)
  circle A0 centre (15, 56) radius 1.6
  circle A1 centre (15, 23) radius 1.6
  point P0 (-8.6721, 0)
  dimension "d155" = 3.2
  dimension "d156" = 3.2
extrude "Extrusión31" cut sketch "Boceto41" against normal blind 65.25
sketch "Boceto42" plane through (5.1721, 40.2641, -98.2) normal (-1, 0, 0) x (0, 0, 1)
  line L0 (9.7, -39.2638) -> (9.7, -34.2638)
  line L1 (9.7, -34.2638) -> (24.7, -34.2638)
  line L2 (24.7, -34.2638) -> (24.7, -39.2638)
  line L3 (9.7, -39.2638) -> (24.7, -39.2638)
  line L4 (0, -39.2638) -> (98.2, -39.2638) projected
  point P0 (98.2, -40.2641)
  point P1 (17.2, -27.608)
extrude "Extrusión32" cut sketch "Boceto42" against normal blind 6.25
sketch "Boceto43" plane through (5.1721, 40.2641, -98.2) normal (-1, 0, 0) x (0, 0, 1)
  line L0 (21.2, -10.7488) -> (93.2, -10.7488) projected
  line L1 (93.2, -10.7488) -> (40, -10.7488)
  line L2 (40, -10.7488) -> (40, -15.7488)
  line L3 (40, -15.7488) -> (93.2, -15.7488)
  line L4 (93.2, -15.7488) -> (93.2, -10.7488)
  line L5 (93.2, -35) -> (40, -35)
  line L6 (40, -35) -> (40, -30)
  line L7 (40, -30) -> (93.2, -30)
  line L8 (93.2, -30) -> (93.2, -35)
  line L9 (103, -15.7488) -> (118.5563, -15.7488) construction
  point P0 (98.2, -40.2641)
  point P1 (22.2, -10.7488)
  dimension "d164" = 5
  dimension "d165" = 5
sketch "Boceto44" plane through (0, 0, 4) normal (0, 0, 1) x (1, 0, 0)
  line L0 (5.1721, -2) -> (5.1721, 40.2641) projected
  line L1 (5.1721, 19.1321) -> (16, 6.2278)
  line L2 (5.1721, 19.1321) -> (22.0173, 19.1321) construction
  point P0 (0, 0)
  dimension "d167" = 50
sweep "Barrido1" cut profiles "Boceto43" path "Boceto44" path curves L1
sketch "Boceto45" plane through (7.1721, -2, 2) normal (0, -1, 0) x (1, 0, 0)
  line L0 (4.0953, -60.2) -> (8.2908, -60.2)
  line L1 (8.2908, -7) -> (4.0953, -7)
  line L2 (8.2908, -7) -> (0, -7)
  line L3 (0, -7) -> (0, -60.2)
  line L4 (0, -60.2) -> (8.2908, -60.2)
  line L5 (8.2908, -60.2) -> (8.2908, -7)
  point P0 (-7.1721, -2)
extrude "Extrusión33" add sketch "Boceto45" against normal blind 3
ref_plane "Plano de trabajo3" through (6.9221, 1.0003, -88.5) normal (0, 1, 0) x (1, 0, 0)
sketch "Boceto47" plane through (6.9221, 1.0003, -88.5) normal (0, 1, 0) x (1, 0, 0)
  line L0 (-1.75, -92.5) -> (-1.75, 18.7) projected
  line L1 (-1.75, -92.5) -> (35, -92.5)
  line L2 (35, -92.5) -> (35, 18.7)
  line L3 (35, 18.7) -> (-1.75, 18.7)
  line L4 (-1.75, 18.7) -> (-1.75, -92.5)
  point P0 (-6.9221, -88.5)
extrude "Extrusión34" cut sketch "Boceto47" along normal blind 79.25
sketch "Boceto48" plane through (42, -2, 4) normal (1, 0, 0) x (0, 0, -1)
  line L0 (0, 0) -> (111.2, 0) projected
  line L1 (0, 0) -> (0, 4.2425) projected
  line L2 (111.2, 0) -> (0, 0)
  line L3 (0, 0) -> (0, 4.2425)
  line L4 (111.2, 4.2425) -> (111.2, 0)
  line L5 (0, 3.0003) -> (111.2, 3.0003) projected
  line L6 (111.2, 3.0003) -> (111.2, 0) projected
  line L7 (0, 3.0003) -> (111.2, 3.0003)
  point P0 (4, 2)
extrude "Extrusión35" add sketch "Boceto48" along normal blind 12
properties part number "Suport - pantalla i potenciometre tapa"
